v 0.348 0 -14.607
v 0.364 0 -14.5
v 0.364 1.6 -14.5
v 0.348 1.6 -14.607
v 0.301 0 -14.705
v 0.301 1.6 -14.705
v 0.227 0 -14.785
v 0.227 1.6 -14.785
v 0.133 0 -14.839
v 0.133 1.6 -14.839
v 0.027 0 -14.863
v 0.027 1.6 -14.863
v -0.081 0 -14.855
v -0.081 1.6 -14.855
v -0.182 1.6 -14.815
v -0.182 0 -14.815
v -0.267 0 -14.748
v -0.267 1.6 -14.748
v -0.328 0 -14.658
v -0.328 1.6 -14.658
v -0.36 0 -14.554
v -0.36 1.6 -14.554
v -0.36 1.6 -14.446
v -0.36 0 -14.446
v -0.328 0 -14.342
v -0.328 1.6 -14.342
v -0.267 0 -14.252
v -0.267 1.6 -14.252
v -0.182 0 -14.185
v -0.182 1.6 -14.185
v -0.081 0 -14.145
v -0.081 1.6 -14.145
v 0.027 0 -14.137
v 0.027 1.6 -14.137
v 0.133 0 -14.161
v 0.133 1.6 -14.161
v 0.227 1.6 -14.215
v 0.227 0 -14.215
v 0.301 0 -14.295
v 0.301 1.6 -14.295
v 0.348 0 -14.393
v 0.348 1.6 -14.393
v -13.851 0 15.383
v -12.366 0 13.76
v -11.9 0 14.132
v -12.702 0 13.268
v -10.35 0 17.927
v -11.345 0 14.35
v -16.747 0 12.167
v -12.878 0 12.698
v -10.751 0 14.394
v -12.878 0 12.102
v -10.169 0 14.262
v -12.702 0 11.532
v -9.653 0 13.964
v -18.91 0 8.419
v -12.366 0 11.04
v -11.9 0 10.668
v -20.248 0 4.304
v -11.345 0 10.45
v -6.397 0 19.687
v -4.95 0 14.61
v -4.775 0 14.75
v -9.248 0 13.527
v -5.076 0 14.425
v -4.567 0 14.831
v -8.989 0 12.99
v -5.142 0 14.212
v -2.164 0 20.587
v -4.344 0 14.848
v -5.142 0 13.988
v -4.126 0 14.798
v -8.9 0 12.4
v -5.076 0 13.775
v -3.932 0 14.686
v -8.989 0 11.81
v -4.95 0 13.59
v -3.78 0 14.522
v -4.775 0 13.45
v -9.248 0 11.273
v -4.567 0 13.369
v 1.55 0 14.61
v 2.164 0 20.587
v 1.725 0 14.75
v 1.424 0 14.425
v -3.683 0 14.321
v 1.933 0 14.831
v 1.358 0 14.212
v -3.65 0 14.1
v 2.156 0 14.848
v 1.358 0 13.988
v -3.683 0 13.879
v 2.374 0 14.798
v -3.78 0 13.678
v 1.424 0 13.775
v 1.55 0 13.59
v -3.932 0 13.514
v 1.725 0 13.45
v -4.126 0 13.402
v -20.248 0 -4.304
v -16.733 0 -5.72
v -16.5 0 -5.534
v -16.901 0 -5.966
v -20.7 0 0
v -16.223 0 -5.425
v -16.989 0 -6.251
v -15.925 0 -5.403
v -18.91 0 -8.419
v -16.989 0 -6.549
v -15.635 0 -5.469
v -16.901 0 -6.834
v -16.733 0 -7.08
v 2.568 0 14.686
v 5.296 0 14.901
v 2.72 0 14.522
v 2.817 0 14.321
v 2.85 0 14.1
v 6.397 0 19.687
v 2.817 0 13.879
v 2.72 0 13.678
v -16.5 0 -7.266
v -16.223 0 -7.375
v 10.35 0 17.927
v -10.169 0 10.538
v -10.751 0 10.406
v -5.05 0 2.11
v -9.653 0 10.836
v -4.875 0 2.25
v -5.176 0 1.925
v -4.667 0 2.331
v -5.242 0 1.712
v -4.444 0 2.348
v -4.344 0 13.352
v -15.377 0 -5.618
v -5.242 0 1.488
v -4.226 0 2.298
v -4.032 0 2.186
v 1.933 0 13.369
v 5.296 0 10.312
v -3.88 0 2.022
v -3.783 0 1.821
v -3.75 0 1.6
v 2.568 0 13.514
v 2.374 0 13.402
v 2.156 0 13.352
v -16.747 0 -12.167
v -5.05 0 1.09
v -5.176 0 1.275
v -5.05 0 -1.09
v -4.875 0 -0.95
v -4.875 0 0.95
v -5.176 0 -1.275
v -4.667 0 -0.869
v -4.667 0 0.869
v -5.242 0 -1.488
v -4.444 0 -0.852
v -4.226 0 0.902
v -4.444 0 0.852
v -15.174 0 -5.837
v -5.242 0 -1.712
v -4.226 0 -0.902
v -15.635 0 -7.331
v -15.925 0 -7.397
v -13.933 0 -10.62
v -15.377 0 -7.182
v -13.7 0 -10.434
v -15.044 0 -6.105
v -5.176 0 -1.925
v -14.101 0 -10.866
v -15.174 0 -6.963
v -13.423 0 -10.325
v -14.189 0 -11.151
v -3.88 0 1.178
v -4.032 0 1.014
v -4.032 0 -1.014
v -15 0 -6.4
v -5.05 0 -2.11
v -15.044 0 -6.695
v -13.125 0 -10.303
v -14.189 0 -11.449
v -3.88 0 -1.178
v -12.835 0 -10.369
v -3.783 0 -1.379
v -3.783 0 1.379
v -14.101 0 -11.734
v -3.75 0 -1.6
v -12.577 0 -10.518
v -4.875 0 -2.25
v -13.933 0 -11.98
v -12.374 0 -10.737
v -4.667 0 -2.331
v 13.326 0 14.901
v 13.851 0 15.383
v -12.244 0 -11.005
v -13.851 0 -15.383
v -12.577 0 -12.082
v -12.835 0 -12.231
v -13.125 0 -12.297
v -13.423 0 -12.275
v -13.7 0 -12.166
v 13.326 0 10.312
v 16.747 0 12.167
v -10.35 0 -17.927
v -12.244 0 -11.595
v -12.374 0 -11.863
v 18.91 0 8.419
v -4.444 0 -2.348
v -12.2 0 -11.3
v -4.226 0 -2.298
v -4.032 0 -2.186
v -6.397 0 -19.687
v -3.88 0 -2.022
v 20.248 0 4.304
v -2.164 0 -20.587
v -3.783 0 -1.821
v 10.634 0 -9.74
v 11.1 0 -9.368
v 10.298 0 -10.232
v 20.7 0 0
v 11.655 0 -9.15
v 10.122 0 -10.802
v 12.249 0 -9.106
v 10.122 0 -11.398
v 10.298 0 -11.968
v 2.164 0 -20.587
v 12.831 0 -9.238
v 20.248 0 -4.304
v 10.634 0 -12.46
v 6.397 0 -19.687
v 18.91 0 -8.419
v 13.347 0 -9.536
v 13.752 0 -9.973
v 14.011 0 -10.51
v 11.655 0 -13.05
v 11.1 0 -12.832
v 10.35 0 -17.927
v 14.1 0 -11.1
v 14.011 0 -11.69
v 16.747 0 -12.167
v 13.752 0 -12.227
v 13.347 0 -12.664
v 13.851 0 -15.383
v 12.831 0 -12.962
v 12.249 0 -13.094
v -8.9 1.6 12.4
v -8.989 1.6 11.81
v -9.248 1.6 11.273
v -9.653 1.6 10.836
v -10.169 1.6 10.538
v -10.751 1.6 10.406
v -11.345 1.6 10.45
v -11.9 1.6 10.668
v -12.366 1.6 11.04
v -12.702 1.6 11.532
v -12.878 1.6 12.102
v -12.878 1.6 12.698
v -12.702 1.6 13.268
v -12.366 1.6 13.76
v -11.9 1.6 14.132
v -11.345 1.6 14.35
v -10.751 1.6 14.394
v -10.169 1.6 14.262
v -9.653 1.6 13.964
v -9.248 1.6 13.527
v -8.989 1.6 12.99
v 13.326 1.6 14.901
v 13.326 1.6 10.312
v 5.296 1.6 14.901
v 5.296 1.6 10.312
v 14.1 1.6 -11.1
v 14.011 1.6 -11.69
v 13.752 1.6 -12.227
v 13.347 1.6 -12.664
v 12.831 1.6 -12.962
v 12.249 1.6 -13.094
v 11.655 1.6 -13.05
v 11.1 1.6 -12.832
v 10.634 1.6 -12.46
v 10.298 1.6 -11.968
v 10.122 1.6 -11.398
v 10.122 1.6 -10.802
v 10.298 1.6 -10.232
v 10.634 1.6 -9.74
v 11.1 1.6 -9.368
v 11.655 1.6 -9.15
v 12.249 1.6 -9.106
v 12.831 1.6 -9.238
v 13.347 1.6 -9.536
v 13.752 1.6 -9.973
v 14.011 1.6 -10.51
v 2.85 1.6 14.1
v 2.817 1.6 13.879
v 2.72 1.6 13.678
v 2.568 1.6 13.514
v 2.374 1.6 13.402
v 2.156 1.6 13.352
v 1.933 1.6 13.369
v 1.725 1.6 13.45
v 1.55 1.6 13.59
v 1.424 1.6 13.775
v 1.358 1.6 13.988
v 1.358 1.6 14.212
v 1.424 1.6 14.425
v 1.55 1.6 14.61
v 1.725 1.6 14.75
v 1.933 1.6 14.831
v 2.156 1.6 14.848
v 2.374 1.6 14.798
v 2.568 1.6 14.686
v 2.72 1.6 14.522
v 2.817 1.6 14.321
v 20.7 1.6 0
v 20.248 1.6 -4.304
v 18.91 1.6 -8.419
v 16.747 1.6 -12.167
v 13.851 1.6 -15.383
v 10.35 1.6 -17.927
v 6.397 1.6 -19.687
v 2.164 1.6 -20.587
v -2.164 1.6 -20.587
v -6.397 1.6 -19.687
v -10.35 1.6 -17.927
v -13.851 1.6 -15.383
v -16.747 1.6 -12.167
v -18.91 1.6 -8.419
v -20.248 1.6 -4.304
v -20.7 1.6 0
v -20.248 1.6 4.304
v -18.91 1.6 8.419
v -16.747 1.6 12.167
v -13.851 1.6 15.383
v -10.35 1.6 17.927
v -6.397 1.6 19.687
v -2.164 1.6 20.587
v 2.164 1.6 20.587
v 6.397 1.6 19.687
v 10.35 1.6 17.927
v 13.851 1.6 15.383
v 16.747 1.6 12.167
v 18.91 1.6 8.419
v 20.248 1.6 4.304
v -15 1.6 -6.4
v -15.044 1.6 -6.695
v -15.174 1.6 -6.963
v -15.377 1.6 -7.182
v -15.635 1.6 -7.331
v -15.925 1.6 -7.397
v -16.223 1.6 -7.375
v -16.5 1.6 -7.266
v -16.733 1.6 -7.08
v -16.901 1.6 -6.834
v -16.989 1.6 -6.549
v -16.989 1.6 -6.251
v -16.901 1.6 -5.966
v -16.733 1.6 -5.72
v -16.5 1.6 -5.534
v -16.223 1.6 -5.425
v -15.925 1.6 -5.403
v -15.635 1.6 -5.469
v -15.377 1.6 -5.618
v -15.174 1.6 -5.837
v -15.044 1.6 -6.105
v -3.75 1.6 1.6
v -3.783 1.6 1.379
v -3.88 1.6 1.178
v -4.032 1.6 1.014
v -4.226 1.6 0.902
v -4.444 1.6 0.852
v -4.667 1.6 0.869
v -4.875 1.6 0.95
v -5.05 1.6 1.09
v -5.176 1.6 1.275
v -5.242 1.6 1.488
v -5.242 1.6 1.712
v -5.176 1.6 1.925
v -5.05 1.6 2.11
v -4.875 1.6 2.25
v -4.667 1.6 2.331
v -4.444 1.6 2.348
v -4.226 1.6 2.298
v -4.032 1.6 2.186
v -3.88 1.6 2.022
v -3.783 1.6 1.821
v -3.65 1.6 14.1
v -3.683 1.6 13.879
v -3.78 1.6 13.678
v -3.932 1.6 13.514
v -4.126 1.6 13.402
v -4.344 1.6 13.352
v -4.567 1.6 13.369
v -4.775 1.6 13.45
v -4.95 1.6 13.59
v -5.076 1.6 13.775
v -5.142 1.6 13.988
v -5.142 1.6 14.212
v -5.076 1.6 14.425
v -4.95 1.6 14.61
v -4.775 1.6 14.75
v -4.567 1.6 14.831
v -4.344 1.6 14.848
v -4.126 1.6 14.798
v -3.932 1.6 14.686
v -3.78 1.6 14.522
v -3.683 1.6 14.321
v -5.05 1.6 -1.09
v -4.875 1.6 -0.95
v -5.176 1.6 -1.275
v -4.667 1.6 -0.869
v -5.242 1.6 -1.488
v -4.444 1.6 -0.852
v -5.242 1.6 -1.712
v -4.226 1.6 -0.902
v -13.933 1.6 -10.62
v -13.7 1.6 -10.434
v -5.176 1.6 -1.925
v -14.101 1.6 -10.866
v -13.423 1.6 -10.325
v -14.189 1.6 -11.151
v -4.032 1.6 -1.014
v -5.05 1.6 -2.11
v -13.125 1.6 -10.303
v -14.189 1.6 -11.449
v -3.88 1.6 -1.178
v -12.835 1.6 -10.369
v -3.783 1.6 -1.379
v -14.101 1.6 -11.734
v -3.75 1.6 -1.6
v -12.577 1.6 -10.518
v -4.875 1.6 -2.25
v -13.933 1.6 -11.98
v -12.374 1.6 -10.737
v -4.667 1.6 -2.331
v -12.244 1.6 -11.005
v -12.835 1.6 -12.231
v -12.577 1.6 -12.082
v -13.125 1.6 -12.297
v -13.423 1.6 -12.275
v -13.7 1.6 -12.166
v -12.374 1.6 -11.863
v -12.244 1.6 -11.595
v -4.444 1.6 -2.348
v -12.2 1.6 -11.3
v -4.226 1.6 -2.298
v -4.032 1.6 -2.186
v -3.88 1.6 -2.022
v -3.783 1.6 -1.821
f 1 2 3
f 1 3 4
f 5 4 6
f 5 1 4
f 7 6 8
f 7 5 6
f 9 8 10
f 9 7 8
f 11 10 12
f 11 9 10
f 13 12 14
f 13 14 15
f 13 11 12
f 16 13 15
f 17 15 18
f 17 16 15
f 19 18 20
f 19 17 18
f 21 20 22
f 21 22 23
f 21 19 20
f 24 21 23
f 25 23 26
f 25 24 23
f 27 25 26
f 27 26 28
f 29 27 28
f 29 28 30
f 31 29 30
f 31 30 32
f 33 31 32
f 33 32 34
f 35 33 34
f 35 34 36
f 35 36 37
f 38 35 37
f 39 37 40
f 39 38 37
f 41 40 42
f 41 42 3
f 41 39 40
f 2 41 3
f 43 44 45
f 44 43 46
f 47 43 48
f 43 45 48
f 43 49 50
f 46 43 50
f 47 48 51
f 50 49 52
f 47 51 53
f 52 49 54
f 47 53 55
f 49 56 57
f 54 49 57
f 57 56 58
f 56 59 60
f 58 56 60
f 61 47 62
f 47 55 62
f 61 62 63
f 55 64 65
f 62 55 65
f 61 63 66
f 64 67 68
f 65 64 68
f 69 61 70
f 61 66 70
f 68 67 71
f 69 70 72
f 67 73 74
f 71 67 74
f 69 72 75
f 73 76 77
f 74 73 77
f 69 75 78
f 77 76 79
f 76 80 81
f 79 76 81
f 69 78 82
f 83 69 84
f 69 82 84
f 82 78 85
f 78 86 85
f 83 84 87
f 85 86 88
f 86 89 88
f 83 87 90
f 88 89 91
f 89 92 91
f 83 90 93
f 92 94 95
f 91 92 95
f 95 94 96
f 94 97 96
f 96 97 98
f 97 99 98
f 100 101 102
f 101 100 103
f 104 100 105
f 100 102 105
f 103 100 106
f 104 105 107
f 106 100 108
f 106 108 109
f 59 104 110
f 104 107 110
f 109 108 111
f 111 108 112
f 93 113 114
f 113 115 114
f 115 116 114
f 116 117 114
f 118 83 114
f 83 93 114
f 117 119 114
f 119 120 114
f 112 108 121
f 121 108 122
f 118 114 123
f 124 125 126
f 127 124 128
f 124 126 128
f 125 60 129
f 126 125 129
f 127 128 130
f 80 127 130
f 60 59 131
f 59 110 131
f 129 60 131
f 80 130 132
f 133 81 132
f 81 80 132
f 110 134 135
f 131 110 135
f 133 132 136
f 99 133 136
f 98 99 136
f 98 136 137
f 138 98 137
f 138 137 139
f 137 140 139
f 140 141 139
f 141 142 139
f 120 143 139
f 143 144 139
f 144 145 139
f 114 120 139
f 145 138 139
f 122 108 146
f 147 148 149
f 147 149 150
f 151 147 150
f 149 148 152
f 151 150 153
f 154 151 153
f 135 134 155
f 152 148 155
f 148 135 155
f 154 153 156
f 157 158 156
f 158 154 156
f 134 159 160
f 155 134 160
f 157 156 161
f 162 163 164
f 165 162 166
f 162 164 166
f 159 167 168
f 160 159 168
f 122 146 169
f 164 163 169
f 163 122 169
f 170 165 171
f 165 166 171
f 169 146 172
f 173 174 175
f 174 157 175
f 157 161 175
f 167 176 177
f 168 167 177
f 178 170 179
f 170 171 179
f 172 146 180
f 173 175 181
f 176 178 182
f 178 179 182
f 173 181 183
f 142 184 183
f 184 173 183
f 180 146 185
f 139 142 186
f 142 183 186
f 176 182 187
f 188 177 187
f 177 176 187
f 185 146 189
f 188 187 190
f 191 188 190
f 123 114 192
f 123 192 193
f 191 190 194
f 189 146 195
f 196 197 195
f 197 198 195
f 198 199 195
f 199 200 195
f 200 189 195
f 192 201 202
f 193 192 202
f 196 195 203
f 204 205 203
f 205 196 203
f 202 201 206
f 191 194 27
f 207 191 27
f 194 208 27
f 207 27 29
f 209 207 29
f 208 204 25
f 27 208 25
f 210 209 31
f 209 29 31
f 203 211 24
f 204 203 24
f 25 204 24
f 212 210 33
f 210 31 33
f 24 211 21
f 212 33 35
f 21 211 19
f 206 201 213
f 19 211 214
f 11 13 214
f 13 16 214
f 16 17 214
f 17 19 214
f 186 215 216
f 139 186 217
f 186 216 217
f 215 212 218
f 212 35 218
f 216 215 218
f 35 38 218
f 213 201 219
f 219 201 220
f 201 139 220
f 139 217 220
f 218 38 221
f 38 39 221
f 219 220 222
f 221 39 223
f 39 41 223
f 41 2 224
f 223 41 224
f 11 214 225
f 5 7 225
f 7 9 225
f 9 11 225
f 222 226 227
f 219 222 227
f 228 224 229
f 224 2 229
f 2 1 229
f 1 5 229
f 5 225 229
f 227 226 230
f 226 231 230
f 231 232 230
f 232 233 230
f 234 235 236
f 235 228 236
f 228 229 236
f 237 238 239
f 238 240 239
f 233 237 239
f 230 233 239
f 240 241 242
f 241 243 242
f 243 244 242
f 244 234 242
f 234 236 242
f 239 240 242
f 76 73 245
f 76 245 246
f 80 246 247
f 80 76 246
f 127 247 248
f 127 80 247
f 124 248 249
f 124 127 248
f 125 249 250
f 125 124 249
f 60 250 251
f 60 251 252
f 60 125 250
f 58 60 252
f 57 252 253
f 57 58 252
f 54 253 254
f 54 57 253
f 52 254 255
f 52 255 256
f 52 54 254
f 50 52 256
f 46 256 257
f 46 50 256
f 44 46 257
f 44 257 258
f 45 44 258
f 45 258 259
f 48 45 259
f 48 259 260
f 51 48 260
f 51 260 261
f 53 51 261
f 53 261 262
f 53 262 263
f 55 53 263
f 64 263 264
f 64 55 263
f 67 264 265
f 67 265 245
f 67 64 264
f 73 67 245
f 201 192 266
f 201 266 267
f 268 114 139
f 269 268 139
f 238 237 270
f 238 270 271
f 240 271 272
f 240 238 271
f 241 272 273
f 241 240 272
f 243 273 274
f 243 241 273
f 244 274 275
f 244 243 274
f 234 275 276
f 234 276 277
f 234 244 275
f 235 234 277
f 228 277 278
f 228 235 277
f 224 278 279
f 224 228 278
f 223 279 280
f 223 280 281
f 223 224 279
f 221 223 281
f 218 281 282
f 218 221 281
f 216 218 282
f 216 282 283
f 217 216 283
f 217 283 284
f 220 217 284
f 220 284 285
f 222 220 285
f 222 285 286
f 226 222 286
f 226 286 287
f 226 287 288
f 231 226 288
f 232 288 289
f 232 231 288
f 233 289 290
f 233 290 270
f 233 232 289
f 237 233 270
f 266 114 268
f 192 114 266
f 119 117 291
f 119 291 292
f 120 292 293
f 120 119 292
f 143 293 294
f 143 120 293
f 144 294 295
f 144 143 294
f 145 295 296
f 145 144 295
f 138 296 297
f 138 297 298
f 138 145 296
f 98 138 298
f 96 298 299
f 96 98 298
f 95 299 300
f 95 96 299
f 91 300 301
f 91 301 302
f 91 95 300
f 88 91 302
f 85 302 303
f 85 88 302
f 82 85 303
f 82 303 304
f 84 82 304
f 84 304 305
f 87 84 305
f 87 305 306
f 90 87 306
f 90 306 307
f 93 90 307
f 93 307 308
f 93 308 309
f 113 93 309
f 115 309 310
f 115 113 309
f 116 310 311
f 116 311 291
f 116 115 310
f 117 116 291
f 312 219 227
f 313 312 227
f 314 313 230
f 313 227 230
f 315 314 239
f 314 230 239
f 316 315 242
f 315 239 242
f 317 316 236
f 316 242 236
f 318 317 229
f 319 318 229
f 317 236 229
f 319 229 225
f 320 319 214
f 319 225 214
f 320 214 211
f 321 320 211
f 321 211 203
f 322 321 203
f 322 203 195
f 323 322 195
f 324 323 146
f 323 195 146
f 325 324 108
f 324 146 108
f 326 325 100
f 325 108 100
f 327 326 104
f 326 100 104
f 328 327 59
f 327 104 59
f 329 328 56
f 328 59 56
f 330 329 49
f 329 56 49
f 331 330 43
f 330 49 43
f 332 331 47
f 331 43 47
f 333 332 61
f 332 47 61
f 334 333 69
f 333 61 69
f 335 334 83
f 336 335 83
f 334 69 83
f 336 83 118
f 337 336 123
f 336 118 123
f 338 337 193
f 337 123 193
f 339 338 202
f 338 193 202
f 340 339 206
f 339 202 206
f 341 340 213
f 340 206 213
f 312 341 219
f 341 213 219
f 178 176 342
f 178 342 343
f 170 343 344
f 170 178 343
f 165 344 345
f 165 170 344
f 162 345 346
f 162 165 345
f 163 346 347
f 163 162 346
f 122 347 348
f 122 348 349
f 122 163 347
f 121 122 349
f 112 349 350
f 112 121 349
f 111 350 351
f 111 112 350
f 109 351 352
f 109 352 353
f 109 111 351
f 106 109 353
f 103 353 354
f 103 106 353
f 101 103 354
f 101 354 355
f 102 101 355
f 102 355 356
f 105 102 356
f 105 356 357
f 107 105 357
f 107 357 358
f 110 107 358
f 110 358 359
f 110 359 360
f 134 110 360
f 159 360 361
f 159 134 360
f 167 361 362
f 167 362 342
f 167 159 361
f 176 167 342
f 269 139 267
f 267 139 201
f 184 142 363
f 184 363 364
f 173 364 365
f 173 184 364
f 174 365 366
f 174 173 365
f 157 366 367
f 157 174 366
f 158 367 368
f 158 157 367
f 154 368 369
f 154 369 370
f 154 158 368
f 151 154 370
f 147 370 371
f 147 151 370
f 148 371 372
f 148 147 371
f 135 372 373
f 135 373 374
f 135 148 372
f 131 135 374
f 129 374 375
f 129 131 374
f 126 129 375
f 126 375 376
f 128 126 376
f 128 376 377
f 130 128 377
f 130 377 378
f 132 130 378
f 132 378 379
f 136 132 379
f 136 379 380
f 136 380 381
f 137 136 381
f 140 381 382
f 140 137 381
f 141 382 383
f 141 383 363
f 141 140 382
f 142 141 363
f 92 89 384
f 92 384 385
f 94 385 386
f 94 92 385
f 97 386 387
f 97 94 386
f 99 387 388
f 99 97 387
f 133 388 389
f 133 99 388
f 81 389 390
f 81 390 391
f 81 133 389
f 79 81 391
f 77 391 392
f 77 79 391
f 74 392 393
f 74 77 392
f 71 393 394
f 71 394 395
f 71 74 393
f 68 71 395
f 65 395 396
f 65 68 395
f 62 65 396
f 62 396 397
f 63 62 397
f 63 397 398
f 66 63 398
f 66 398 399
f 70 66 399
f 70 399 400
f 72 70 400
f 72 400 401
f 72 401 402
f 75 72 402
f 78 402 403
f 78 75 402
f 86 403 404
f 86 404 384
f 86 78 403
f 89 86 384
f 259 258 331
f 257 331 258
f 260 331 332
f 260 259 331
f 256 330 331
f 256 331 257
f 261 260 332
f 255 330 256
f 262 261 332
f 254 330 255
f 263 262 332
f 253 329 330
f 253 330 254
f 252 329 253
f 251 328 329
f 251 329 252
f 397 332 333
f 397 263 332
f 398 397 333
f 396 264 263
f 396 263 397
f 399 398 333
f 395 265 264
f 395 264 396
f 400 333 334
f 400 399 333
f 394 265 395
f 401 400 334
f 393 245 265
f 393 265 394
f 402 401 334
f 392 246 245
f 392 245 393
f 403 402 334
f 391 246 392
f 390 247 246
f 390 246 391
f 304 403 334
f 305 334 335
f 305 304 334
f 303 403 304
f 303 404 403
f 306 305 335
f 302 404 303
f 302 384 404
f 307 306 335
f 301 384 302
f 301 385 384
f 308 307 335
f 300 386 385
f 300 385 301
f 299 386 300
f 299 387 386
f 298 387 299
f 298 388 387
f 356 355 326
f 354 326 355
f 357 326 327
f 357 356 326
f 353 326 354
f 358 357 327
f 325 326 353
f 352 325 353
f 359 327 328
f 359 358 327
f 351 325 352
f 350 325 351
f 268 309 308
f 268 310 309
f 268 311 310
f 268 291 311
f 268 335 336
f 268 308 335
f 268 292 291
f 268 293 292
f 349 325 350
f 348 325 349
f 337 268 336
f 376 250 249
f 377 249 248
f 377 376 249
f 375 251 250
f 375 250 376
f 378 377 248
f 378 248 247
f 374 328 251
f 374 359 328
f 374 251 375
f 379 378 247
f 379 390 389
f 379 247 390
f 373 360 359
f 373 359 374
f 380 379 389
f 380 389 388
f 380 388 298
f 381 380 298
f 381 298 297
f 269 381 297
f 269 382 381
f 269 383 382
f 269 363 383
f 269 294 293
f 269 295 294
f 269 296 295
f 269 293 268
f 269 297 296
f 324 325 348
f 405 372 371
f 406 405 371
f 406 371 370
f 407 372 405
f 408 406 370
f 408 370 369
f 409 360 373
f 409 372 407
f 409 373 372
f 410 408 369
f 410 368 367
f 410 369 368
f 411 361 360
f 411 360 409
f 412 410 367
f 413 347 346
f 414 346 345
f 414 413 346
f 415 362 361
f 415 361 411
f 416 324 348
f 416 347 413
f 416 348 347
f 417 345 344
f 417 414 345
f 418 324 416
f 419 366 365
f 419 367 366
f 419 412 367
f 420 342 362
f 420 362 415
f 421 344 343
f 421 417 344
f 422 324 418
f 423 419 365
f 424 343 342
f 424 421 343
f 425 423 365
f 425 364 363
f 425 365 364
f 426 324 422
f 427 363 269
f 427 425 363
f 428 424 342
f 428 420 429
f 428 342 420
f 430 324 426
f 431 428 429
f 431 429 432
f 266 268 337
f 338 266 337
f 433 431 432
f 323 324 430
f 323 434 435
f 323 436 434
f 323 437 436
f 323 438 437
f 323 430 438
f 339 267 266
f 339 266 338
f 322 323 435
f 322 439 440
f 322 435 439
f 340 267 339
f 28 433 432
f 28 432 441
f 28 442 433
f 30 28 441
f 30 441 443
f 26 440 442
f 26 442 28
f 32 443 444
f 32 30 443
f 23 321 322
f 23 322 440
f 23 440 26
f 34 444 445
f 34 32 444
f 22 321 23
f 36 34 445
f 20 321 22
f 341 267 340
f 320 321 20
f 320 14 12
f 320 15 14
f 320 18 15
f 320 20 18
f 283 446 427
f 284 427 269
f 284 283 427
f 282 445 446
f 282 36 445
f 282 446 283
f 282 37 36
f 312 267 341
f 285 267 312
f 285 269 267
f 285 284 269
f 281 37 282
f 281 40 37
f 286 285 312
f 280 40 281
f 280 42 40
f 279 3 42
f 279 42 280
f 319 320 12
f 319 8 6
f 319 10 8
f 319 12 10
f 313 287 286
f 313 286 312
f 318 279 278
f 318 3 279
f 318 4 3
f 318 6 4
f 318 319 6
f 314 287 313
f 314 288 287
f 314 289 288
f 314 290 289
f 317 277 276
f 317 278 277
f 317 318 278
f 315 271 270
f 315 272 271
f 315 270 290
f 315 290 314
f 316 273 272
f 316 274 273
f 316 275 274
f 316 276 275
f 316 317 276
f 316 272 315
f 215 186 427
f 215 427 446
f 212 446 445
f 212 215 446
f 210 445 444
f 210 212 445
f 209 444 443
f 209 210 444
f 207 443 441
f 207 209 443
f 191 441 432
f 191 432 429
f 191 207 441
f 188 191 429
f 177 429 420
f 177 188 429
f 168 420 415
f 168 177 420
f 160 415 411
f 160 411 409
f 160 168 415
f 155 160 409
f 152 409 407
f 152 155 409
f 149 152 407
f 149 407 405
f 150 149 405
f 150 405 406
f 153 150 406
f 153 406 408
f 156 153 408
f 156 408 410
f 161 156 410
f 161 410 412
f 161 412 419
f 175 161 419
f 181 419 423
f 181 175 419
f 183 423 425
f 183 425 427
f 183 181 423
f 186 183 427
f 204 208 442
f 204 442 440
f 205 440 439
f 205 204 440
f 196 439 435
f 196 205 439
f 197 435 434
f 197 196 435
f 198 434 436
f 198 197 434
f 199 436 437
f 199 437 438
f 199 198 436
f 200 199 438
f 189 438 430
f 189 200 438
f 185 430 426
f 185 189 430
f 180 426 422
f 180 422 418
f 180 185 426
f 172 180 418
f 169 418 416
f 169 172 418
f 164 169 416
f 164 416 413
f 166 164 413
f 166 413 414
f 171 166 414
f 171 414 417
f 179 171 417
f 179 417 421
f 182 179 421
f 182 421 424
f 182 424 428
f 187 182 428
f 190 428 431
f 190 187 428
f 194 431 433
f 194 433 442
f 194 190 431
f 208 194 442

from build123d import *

# Parameters (mm, degrees)
SKETCH_1_R      = 20.7
SKETCH_1_R_2    = 2
SKETCH_1_R_3    = 1
SKETCH_1_R_4    = 0.363900589
SKETCH_1_R_5    = 0.75
SKETCH_1_W      = 8.030309373
SKETCH_1_H      = 4.588748213
EXTRUDE_1_DEPTH = 1.6


with BuildPart() as part:
    # Эскиз1 → Бобышка-Вытянуть1 (new body)
    with BuildSketch(Plane(origin=(0, 0, 0), x_dir=(1, 0, 0), z_dir=(0, 1, 0))):
        Circle(SKETCH_1_R)
        with Locations((12.1, 11.1)):
            Circle(SKETCH_1_R_2, mode=Mode.SUBTRACT)
        with Locations((-10.9, -12.4)):
            Circle(SKETCH_1_R_2, mode=Mode.SUBTRACT)
        with Locations((-16, 6.4)):
            Circle(SKETCH_1_R_3, mode=Mode.SUBTRACT)
        with Locations((-13.2, 11.3)):
            Circle(SKETCH_1_R_3, mode=Mode.SUBTRACT)
        with Locations((0, 14.5)):
            Circle(SKETCH_1_R_4, mode=Mode.SUBTRACT)
        with Locations((-4.5, 1.6)):
            Circle(SKETCH_1_R_5, mode=Mode.SUBTRACT)
        with Locations((-4.5, -1.6)):
            Circle(SKETCH_1_R_5, mode=Mode.SUBTRACT)
        with Locations((-4.4, -14.1)):
            Circle(SKETCH_1_R_5, mode=Mode.SUBTRACT)
        with Locations((2.1, -14.1)):
            Circle(SKETCH_1_R_5, mode=Mode.SUBTRACT)
        with Locations((9.310736127, -12.60613493)):
            Rectangle(SKETCH_1_W, SKETCH_1_H, mode=Mode.SUBTRACT)
    extrude(amount=EXTRUDE_1_DEPTH)


solid = part.part
